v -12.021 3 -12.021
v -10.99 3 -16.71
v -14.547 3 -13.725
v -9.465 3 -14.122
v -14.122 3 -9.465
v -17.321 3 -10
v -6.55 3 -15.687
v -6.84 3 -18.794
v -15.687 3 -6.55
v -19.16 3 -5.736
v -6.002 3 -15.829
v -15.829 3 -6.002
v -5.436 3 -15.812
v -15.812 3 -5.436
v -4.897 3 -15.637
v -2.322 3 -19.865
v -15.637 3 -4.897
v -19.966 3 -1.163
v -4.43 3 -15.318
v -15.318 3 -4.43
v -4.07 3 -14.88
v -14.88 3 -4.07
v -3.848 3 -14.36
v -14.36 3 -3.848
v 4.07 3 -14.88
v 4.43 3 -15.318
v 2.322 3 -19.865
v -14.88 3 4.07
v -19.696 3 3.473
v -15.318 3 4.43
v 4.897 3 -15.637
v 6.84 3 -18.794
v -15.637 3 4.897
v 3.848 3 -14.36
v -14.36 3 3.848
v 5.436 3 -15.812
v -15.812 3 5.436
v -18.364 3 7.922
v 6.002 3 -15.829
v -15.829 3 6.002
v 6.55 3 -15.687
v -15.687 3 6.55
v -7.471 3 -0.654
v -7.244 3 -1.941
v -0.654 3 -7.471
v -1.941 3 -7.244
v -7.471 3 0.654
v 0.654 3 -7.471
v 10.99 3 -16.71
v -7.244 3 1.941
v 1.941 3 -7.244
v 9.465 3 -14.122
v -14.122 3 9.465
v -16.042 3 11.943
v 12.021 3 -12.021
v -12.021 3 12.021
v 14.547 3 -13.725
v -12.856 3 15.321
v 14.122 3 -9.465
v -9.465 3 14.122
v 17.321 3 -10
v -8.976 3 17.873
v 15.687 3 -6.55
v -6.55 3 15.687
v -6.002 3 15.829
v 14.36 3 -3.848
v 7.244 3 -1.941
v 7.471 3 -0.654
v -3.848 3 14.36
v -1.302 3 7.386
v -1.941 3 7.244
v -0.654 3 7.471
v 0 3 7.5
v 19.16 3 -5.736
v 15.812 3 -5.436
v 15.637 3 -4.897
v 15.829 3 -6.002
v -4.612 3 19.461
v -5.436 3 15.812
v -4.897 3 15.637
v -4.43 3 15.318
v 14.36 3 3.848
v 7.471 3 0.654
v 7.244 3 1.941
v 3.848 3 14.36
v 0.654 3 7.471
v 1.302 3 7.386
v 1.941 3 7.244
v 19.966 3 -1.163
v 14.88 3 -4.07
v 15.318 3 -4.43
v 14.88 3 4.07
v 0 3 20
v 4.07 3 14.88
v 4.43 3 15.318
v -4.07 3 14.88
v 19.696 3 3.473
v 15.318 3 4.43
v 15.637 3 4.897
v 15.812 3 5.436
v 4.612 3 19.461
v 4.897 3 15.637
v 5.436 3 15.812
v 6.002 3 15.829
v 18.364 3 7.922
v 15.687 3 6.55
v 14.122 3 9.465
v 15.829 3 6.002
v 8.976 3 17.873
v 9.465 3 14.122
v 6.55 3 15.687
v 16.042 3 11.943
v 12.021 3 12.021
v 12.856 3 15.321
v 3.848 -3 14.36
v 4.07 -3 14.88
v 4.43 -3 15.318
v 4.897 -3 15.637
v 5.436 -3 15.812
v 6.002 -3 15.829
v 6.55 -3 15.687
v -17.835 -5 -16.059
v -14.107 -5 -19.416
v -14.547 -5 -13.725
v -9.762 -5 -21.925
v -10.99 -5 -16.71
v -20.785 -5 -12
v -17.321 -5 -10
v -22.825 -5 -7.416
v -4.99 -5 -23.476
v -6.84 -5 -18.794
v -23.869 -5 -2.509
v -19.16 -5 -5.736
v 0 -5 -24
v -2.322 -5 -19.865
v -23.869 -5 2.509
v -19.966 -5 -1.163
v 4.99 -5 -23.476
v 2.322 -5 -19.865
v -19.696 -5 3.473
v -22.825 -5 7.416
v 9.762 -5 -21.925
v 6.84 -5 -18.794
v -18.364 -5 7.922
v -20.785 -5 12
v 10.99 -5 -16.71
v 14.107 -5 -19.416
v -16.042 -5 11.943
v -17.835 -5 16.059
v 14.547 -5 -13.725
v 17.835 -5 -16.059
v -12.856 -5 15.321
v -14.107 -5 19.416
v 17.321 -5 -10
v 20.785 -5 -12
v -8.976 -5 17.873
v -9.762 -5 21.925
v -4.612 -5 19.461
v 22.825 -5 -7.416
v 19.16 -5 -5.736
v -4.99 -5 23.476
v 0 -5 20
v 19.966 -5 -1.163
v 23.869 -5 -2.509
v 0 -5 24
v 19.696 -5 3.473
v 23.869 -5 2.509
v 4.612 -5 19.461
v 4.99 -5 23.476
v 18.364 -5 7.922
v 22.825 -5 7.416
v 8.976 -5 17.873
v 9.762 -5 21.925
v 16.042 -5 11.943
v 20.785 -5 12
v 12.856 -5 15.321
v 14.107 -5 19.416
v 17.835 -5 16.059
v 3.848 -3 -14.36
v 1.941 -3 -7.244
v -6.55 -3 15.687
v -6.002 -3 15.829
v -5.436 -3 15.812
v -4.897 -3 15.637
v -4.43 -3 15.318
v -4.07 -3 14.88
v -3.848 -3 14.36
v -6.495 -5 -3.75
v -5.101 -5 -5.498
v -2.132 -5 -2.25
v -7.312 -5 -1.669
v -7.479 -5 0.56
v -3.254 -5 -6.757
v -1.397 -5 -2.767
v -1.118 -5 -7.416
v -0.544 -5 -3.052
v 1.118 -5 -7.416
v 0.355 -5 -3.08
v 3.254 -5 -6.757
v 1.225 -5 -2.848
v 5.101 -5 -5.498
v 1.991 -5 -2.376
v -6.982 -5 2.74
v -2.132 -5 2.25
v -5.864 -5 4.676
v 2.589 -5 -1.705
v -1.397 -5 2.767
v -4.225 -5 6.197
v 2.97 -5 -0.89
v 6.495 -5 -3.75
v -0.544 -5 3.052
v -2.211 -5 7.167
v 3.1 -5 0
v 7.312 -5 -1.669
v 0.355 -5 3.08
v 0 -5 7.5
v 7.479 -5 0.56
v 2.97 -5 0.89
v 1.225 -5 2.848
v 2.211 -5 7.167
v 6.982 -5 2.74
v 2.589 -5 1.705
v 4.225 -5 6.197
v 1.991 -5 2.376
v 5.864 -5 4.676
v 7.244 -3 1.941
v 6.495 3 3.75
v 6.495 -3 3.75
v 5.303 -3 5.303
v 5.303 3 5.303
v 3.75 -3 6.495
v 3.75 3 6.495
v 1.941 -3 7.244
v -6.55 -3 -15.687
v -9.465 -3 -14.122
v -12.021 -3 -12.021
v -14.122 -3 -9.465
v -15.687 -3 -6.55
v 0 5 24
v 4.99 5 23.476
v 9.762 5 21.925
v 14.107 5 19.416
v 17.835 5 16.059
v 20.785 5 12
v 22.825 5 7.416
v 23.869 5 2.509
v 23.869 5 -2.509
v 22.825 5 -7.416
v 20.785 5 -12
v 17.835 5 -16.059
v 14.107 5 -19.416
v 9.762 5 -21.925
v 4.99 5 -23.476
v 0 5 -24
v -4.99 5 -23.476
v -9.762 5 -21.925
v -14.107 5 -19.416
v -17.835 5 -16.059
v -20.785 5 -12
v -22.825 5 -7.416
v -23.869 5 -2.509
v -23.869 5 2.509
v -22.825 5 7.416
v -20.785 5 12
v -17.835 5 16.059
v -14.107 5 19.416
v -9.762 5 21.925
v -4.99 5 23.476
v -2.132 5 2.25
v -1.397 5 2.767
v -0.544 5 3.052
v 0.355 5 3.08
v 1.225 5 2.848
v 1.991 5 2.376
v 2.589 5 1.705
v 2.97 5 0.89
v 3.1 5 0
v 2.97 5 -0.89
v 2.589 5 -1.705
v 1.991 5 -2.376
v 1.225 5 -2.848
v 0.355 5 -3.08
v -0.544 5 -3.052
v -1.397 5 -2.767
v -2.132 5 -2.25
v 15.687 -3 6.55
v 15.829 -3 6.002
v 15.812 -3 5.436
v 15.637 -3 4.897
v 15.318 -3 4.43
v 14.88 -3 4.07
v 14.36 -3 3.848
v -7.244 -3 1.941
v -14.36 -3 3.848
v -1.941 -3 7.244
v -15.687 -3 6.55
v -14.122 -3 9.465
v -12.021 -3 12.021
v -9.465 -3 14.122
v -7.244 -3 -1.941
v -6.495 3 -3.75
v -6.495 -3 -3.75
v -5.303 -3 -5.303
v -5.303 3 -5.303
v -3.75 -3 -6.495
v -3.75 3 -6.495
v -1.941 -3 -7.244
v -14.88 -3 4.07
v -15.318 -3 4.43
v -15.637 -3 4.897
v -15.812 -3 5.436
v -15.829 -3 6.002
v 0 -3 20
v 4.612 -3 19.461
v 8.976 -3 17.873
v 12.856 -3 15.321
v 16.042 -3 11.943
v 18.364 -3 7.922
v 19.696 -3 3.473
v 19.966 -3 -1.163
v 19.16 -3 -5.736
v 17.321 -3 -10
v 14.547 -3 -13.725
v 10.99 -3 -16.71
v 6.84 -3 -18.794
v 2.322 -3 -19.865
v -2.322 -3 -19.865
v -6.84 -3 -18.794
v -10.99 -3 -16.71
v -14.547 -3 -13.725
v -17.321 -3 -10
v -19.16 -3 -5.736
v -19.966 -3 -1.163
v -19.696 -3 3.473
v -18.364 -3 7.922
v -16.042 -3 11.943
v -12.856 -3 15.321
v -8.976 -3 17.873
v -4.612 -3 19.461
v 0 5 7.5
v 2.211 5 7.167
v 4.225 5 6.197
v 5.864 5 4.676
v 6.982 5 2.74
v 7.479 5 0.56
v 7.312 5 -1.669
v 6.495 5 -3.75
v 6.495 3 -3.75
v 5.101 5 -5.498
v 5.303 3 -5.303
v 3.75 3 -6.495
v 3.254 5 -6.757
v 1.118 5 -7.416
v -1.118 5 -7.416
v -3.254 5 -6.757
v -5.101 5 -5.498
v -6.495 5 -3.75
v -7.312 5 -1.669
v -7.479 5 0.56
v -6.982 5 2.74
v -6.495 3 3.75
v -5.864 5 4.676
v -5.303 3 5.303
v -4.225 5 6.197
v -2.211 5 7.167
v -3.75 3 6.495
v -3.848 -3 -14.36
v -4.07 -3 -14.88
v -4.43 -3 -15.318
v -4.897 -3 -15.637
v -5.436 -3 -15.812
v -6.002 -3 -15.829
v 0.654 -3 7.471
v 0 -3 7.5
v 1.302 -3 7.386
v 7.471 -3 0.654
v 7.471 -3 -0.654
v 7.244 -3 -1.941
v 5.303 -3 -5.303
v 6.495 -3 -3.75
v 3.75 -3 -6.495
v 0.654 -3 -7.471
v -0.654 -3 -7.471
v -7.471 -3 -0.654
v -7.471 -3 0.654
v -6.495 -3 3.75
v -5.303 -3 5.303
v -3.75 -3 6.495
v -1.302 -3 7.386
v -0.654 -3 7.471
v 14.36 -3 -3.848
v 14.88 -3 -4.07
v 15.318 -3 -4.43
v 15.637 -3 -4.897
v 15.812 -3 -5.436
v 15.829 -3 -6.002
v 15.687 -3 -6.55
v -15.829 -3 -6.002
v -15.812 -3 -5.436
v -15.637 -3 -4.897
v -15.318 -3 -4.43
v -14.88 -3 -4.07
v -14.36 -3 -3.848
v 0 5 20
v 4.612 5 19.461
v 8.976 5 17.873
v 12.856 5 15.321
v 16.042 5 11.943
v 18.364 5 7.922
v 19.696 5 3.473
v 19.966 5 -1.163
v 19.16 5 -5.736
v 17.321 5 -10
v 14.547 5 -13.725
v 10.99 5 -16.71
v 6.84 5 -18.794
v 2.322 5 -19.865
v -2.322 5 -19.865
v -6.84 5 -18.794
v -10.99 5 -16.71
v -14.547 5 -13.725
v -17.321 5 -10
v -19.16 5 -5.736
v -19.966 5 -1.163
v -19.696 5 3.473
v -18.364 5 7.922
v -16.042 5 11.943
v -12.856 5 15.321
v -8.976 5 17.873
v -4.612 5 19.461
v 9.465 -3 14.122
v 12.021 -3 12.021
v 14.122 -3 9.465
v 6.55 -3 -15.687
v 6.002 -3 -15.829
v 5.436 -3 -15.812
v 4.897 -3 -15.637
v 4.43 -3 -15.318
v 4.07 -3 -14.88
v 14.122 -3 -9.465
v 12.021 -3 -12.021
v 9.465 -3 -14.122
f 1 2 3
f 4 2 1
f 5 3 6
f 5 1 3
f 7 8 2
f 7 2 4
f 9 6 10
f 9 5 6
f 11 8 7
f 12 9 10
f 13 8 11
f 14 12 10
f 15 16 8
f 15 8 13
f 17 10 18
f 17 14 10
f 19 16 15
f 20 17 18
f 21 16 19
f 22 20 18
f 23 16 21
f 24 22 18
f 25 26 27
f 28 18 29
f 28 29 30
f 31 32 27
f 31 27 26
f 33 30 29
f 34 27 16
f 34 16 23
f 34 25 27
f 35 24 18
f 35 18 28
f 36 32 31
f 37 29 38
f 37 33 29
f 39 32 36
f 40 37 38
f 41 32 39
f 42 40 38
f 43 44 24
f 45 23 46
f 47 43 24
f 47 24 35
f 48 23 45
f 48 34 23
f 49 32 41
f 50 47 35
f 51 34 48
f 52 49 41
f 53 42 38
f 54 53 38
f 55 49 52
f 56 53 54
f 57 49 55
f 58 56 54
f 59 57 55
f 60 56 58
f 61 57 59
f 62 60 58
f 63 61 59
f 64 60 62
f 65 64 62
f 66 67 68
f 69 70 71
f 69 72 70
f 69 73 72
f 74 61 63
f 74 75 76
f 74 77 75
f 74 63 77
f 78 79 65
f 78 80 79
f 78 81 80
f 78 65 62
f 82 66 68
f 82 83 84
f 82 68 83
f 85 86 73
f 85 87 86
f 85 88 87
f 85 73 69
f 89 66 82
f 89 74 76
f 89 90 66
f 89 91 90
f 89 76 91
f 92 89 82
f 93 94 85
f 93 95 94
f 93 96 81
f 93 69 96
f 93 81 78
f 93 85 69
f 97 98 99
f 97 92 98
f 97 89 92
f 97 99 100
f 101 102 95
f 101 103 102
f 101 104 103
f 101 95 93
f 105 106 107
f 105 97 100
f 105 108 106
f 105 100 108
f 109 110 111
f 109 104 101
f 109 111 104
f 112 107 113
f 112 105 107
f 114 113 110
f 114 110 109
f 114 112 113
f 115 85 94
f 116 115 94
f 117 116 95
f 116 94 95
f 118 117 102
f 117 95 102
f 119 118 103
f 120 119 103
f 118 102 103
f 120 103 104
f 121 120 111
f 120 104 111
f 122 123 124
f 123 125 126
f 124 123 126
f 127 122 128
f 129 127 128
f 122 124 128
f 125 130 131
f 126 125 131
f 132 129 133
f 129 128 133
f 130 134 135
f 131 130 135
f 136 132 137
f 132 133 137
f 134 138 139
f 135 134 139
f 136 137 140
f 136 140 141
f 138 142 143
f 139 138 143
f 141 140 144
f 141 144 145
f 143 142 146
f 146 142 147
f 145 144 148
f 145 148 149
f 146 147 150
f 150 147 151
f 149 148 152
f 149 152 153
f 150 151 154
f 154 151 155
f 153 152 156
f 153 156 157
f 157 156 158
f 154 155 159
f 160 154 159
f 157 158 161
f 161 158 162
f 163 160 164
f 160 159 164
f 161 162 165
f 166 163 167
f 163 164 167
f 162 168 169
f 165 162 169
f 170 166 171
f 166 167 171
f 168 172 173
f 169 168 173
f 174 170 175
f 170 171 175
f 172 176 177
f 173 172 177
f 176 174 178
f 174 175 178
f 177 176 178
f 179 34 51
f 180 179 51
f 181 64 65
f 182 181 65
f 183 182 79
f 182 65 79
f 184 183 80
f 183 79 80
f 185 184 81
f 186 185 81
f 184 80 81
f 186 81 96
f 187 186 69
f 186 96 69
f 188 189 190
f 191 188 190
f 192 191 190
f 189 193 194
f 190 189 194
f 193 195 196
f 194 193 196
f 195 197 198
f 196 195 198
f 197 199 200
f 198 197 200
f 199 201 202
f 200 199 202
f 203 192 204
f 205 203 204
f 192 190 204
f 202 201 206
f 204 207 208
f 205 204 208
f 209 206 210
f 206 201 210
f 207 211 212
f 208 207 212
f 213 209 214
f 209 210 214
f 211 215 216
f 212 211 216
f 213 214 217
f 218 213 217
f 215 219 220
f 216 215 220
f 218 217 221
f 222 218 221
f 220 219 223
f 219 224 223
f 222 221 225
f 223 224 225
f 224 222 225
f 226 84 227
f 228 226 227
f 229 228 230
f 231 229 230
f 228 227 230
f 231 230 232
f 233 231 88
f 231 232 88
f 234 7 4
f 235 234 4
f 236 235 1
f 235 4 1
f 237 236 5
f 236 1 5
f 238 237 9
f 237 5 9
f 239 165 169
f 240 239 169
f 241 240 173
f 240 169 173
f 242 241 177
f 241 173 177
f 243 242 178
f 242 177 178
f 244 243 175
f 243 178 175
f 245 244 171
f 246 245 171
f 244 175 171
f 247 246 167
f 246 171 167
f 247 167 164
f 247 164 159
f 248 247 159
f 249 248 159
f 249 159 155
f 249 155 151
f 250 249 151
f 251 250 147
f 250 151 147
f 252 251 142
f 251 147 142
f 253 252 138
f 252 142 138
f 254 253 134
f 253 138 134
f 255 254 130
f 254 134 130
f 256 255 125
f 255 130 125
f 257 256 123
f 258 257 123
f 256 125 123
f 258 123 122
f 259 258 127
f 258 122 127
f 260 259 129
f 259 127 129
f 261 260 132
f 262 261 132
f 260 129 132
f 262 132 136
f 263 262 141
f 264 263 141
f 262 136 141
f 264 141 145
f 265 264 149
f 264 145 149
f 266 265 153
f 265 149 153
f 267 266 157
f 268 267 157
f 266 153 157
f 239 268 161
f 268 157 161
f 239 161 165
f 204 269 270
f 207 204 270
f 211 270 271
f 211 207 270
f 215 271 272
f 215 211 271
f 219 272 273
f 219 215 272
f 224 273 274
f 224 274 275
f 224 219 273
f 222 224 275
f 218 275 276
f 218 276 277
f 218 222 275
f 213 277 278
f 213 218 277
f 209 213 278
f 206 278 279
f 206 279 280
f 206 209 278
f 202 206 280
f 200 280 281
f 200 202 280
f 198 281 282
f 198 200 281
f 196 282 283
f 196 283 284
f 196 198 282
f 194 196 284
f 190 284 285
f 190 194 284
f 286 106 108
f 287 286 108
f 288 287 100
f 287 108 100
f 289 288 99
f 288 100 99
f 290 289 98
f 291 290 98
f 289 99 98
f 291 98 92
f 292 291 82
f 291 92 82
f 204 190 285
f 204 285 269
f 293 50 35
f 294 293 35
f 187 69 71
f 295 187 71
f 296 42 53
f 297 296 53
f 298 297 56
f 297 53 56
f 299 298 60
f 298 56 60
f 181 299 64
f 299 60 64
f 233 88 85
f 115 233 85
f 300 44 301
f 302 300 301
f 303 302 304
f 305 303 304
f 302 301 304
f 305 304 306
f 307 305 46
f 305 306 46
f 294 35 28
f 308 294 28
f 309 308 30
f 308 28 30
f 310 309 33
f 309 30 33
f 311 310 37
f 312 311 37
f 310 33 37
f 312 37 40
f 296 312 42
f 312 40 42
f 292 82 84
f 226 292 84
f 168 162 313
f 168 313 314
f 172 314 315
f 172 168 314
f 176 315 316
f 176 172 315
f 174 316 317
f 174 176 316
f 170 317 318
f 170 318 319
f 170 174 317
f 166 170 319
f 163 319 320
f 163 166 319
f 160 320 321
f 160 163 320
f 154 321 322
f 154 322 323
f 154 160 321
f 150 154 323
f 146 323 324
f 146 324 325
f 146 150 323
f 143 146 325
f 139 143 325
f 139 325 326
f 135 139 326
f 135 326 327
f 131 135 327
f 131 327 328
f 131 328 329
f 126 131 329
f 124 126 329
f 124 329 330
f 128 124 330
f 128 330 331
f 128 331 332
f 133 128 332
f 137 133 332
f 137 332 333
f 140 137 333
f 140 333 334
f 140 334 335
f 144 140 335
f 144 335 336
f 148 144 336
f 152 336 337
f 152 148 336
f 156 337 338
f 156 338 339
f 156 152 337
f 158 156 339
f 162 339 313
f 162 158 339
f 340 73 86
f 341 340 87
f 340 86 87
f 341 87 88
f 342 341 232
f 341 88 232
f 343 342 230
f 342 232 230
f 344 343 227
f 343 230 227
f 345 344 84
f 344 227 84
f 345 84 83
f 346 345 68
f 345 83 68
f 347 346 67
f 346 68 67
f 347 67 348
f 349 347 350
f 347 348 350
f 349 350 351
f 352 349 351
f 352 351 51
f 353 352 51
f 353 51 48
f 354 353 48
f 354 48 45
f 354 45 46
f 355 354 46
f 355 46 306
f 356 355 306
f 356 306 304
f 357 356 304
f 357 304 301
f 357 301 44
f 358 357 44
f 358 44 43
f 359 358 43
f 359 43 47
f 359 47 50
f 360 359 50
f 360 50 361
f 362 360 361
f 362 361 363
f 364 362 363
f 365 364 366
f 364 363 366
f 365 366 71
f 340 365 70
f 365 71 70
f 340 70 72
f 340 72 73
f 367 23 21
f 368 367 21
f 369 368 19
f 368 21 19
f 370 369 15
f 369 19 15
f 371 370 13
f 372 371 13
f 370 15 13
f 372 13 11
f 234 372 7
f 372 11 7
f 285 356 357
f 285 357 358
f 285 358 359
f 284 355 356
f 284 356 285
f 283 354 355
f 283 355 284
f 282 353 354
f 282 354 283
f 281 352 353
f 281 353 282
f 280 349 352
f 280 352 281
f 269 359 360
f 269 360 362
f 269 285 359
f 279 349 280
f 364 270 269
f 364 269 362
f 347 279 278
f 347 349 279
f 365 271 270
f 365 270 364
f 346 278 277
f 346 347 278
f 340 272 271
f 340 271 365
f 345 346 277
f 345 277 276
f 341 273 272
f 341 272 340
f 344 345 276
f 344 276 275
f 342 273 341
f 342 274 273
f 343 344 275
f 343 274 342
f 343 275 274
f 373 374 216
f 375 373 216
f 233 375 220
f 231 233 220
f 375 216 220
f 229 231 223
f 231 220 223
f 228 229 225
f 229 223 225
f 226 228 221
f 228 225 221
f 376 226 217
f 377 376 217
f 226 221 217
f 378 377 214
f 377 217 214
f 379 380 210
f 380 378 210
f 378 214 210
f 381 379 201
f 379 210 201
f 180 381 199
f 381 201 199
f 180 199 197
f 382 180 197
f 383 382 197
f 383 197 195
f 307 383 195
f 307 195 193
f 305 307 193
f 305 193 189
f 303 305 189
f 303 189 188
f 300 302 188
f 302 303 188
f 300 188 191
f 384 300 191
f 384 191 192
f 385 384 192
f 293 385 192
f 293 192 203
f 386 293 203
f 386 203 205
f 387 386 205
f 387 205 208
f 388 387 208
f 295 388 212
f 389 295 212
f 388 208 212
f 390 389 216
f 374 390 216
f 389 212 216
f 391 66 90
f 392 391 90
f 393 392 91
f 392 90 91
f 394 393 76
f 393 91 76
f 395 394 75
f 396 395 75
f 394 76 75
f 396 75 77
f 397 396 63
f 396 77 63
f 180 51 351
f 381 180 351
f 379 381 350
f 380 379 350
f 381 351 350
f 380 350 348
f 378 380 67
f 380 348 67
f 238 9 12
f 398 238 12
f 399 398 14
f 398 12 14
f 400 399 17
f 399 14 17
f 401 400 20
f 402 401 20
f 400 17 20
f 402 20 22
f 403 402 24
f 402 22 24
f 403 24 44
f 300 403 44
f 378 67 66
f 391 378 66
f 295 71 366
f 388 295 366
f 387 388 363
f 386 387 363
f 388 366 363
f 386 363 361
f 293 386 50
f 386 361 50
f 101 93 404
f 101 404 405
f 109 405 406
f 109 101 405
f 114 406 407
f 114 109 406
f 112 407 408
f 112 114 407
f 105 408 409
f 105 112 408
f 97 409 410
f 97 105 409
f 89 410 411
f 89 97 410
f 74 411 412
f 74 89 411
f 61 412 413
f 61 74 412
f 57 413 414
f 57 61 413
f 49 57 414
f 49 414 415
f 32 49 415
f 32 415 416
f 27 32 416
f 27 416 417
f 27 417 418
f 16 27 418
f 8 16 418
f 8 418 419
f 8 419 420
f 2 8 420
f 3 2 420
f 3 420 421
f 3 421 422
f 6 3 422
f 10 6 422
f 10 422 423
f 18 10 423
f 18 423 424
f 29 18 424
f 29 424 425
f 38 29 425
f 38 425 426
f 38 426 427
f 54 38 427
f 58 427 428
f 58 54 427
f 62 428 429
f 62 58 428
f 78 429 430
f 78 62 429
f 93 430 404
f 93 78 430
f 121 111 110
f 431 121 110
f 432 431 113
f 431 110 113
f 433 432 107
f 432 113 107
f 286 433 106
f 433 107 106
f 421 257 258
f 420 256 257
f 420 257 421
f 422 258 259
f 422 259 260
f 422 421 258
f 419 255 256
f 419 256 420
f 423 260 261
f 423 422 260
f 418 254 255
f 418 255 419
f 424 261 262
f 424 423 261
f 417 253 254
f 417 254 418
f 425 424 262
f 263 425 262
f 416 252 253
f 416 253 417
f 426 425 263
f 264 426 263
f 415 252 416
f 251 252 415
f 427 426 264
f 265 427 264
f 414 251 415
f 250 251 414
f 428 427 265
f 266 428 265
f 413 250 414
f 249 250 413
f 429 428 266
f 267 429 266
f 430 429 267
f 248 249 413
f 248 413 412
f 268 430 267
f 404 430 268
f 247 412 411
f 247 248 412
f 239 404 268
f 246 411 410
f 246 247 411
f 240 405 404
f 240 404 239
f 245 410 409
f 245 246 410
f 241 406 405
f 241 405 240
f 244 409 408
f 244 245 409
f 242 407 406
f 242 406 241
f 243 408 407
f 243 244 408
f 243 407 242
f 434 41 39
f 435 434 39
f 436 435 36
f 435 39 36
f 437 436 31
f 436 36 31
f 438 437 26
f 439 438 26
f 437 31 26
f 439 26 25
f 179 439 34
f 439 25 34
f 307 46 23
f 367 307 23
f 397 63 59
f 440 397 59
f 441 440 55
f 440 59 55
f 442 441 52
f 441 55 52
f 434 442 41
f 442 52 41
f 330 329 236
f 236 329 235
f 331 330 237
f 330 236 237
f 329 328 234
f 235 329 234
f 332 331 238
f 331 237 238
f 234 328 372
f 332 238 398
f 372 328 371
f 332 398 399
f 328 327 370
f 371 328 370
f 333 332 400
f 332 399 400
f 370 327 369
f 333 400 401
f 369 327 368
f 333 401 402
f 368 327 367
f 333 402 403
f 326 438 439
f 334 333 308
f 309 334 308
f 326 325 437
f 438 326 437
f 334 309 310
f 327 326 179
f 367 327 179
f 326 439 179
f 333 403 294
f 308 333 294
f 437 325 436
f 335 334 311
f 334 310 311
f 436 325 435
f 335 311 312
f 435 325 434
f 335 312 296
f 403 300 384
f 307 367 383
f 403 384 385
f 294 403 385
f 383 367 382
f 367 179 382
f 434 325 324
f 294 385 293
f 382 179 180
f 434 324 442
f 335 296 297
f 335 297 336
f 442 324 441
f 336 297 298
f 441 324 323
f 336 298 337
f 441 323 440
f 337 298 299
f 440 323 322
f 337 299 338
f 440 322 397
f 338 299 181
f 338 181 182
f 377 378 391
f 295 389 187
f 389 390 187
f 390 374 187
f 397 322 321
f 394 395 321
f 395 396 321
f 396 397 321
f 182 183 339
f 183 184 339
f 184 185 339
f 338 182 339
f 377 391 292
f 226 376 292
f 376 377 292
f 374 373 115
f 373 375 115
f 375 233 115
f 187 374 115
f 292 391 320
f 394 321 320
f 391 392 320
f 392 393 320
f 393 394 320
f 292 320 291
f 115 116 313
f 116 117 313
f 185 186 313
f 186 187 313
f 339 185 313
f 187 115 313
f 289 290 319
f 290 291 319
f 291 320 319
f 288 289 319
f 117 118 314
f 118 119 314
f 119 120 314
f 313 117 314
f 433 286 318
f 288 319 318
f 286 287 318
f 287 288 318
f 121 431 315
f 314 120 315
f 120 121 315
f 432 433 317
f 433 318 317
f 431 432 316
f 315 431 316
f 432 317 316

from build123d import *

# Parameters (mm, degrees)
EXTRUDE_1_DEPTH        = 5
EXTRUDE_1_DEPTH_BACK   = 5
SKETCH_1_R             = 24
SKETCH_1_R_2           = 20
EXTRUDE_1_2_DEPTH      = 5
EXTRUDE_1_2_DEPTH_BACK = 5
SKETCH_1_R_3           = 7.5
EXTRUDE_2_DEPTH        = 3
EXTRUDE_2_DEPTH_BACK   = 3
SKETCH_1_4_R           = 20
SKETCH_1_4_R_2         = 7.5
CUT_EXTRUDE_2_DEPTH    = 6


with BuildPart() as part:
    # 草图1 → 凸台-拉伸1 (new, two sides: drawn at the far end of the back side and taken through both)
    with BuildSketch(Plane(origin=(0, 0, 0), x_dir=(1, 0, 0), z_dir=(0, 1, 0)).offset(-EXTRUDE_1_DEPTH_BACK)):
        Circle(SKETCH_1_R)
        Circle(SKETCH_1_R_2, mode=Mode.SUBTRACT)
    extrude(amount=EXTRUDE_1_DEPTH + EXTRUDE_1_DEPTH_BACK)



with BuildPart() as body_2:
    # 草图1 → Extrude 1 2 (new, two sides: drawn at the far end of the back side and taken through both)
    with BuildSketch(Plane(origin=(0, 0, 0), x_dir=(1, 0, 0), z_dir=(0, 1, 0)).offset(-EXTRUDE_1_2_DEPTH_BACK)):
        Circle(SKETCH_1_R_3)
        with BuildLine():
            Line((-2.132486811, -2.25), (-2.132486811, 2.25))
            ThreePointArc((-2.132486811, 2.25), (3.1, 0), (-2.132486811, -2.25))
        make_face(mode=Mode.SUBTRACT)
    extrude(amount=EXTRUDE_1_2_DEPTH + EXTRUDE_1_2_DEPTH_BACK)


with BuildPart() as part_1:
    add(part.part)

    add(body_2.part)  # 凸台-拉伸2 merges body 2
    # 草图1<4> → 凸台-拉伸2 (add, two sides: drawn at the far end of the back side and taken through both)
    with BuildSketch(Plane(origin=(0, 0, 0), x_dir=(1, 0, 0), z_dir=(0, 1, 0)).offset(-EXTRUDE_2_DEPTH_BACK)):
        Circle(SKETCH_1_4_R)
        Circle(SKETCH_1_4_R_2, mode=Mode.SUBTRACT)
    extrude(amount=EXTRUDE_2_DEPTH + EXTRUDE_2_DEPTH_BACK)

    # 草图3 → 切除-拉伸2 (cut)
    with BuildSketch(Plane(origin=(0, 3, 0), x_dir=(1, 0, 0), z_dir=(0, 1, 0))):
        with BuildLine():
            Line((3.847621718, 14.359519738), (1.941142838, 7.244443697))
            ThreePointArc((1.941142838, 7.244443697), (5.303300859, 5.303300859), (7.244443697, 1.941142838))
            Line((7.244443697, 1.941142838), (14.359519738, 3.847621718))
            ThreePointArc((14.359519738, 3.847621718), (15.636877848, 4.897436726), (15.687465868, 6.55006982))
            ThreePointArc((15.687465868, 6.55006982), (12.02081528, 12.02081528), (6.55006982, 15.687465868))
            ThreePointArc((6.55006982, 15.687465868), (4.897436726, 15.636877848), (3.847621718, 14.359519738))
        make_face()
        with BuildLine():
            ThreePointArc((7.244443697, -1.941142838), (5.303300859, -5.303300859), (1.941142838, -7.244443697))
            Line((1.941142838, -7.244443697), (3.847621718, -14.359519738))
            ThreePointArc((3.847621718, -14.359519738), (4.897436726, -15.636877848), (6.55006982, -15.687465868))
            ThreePointArc((6.55006982, -15.687465868), (12.02081528, -12.02081528), (15.687465868, -6.55006982))
            ThreePointArc((15.687465868, -6.55006982), (15.636877848, -4.897436726), (14.359519738, -3.847621718))
            Line((14.359519738, -3.847621718), (7.244443697, -1.941142838))
        make_face()
        with BuildLine():
            ThreePointArc((-1.941142838, -7.244443697), (-5.303300859, -5.303300859), (-7.244443697, -1.941142838))
            Line((-7.244443697, -1.941142838), (-14.359519738, -3.847621718))
            ThreePointArc((-14.359519738, -3.847621718), (-15.636877848, -4.897436726), (-15.687465868, -6.55006982))
            ThreePointArc((-15.687465868, -6.55006982), (-12.02081528, -12.02081528), (-6.55006982, -15.687465868))
            ThreePointArc((-6.55006982, -15.687465868), (-4.897436726, -15.636877848), (-3.847621718, -14.359519738))
            Line((-3.847621718, -14.359519738), (-1.941142838, -7.244443697))
        make_face()
        with BuildLine():
            ThreePointArc((-7.244443697, 1.941142838), (-5.303300859, 5.303300859), (-1.941142838, 7.244443697))
            Line((-1.941142838, 7.244443697), (-3.847621718, 14.359519738))
            ThreePointArc((-3.847621718, 14.359519738), (-4.897436726, 15.636877848), (-6.55006982, 15.687465868))
            ThreePointArc((-6.55006982, 15.687465868), (-12.02081528, 12.02081528), (-15.687465868, 6.55006982))
            ThreePointArc((-15.687465868, 6.55006982), (-15.636877848, 4.897436726), (-14.359519738, 3.847621718))
            Line((-14.359519738, 3.847621718), (-7.244443697, 1.941142838))
        make_face()
    extrude(amount=-CUT_EXTRUDE_2_DEPTH, mode=Mode.SUBTRACT)


solid = part_1.part
